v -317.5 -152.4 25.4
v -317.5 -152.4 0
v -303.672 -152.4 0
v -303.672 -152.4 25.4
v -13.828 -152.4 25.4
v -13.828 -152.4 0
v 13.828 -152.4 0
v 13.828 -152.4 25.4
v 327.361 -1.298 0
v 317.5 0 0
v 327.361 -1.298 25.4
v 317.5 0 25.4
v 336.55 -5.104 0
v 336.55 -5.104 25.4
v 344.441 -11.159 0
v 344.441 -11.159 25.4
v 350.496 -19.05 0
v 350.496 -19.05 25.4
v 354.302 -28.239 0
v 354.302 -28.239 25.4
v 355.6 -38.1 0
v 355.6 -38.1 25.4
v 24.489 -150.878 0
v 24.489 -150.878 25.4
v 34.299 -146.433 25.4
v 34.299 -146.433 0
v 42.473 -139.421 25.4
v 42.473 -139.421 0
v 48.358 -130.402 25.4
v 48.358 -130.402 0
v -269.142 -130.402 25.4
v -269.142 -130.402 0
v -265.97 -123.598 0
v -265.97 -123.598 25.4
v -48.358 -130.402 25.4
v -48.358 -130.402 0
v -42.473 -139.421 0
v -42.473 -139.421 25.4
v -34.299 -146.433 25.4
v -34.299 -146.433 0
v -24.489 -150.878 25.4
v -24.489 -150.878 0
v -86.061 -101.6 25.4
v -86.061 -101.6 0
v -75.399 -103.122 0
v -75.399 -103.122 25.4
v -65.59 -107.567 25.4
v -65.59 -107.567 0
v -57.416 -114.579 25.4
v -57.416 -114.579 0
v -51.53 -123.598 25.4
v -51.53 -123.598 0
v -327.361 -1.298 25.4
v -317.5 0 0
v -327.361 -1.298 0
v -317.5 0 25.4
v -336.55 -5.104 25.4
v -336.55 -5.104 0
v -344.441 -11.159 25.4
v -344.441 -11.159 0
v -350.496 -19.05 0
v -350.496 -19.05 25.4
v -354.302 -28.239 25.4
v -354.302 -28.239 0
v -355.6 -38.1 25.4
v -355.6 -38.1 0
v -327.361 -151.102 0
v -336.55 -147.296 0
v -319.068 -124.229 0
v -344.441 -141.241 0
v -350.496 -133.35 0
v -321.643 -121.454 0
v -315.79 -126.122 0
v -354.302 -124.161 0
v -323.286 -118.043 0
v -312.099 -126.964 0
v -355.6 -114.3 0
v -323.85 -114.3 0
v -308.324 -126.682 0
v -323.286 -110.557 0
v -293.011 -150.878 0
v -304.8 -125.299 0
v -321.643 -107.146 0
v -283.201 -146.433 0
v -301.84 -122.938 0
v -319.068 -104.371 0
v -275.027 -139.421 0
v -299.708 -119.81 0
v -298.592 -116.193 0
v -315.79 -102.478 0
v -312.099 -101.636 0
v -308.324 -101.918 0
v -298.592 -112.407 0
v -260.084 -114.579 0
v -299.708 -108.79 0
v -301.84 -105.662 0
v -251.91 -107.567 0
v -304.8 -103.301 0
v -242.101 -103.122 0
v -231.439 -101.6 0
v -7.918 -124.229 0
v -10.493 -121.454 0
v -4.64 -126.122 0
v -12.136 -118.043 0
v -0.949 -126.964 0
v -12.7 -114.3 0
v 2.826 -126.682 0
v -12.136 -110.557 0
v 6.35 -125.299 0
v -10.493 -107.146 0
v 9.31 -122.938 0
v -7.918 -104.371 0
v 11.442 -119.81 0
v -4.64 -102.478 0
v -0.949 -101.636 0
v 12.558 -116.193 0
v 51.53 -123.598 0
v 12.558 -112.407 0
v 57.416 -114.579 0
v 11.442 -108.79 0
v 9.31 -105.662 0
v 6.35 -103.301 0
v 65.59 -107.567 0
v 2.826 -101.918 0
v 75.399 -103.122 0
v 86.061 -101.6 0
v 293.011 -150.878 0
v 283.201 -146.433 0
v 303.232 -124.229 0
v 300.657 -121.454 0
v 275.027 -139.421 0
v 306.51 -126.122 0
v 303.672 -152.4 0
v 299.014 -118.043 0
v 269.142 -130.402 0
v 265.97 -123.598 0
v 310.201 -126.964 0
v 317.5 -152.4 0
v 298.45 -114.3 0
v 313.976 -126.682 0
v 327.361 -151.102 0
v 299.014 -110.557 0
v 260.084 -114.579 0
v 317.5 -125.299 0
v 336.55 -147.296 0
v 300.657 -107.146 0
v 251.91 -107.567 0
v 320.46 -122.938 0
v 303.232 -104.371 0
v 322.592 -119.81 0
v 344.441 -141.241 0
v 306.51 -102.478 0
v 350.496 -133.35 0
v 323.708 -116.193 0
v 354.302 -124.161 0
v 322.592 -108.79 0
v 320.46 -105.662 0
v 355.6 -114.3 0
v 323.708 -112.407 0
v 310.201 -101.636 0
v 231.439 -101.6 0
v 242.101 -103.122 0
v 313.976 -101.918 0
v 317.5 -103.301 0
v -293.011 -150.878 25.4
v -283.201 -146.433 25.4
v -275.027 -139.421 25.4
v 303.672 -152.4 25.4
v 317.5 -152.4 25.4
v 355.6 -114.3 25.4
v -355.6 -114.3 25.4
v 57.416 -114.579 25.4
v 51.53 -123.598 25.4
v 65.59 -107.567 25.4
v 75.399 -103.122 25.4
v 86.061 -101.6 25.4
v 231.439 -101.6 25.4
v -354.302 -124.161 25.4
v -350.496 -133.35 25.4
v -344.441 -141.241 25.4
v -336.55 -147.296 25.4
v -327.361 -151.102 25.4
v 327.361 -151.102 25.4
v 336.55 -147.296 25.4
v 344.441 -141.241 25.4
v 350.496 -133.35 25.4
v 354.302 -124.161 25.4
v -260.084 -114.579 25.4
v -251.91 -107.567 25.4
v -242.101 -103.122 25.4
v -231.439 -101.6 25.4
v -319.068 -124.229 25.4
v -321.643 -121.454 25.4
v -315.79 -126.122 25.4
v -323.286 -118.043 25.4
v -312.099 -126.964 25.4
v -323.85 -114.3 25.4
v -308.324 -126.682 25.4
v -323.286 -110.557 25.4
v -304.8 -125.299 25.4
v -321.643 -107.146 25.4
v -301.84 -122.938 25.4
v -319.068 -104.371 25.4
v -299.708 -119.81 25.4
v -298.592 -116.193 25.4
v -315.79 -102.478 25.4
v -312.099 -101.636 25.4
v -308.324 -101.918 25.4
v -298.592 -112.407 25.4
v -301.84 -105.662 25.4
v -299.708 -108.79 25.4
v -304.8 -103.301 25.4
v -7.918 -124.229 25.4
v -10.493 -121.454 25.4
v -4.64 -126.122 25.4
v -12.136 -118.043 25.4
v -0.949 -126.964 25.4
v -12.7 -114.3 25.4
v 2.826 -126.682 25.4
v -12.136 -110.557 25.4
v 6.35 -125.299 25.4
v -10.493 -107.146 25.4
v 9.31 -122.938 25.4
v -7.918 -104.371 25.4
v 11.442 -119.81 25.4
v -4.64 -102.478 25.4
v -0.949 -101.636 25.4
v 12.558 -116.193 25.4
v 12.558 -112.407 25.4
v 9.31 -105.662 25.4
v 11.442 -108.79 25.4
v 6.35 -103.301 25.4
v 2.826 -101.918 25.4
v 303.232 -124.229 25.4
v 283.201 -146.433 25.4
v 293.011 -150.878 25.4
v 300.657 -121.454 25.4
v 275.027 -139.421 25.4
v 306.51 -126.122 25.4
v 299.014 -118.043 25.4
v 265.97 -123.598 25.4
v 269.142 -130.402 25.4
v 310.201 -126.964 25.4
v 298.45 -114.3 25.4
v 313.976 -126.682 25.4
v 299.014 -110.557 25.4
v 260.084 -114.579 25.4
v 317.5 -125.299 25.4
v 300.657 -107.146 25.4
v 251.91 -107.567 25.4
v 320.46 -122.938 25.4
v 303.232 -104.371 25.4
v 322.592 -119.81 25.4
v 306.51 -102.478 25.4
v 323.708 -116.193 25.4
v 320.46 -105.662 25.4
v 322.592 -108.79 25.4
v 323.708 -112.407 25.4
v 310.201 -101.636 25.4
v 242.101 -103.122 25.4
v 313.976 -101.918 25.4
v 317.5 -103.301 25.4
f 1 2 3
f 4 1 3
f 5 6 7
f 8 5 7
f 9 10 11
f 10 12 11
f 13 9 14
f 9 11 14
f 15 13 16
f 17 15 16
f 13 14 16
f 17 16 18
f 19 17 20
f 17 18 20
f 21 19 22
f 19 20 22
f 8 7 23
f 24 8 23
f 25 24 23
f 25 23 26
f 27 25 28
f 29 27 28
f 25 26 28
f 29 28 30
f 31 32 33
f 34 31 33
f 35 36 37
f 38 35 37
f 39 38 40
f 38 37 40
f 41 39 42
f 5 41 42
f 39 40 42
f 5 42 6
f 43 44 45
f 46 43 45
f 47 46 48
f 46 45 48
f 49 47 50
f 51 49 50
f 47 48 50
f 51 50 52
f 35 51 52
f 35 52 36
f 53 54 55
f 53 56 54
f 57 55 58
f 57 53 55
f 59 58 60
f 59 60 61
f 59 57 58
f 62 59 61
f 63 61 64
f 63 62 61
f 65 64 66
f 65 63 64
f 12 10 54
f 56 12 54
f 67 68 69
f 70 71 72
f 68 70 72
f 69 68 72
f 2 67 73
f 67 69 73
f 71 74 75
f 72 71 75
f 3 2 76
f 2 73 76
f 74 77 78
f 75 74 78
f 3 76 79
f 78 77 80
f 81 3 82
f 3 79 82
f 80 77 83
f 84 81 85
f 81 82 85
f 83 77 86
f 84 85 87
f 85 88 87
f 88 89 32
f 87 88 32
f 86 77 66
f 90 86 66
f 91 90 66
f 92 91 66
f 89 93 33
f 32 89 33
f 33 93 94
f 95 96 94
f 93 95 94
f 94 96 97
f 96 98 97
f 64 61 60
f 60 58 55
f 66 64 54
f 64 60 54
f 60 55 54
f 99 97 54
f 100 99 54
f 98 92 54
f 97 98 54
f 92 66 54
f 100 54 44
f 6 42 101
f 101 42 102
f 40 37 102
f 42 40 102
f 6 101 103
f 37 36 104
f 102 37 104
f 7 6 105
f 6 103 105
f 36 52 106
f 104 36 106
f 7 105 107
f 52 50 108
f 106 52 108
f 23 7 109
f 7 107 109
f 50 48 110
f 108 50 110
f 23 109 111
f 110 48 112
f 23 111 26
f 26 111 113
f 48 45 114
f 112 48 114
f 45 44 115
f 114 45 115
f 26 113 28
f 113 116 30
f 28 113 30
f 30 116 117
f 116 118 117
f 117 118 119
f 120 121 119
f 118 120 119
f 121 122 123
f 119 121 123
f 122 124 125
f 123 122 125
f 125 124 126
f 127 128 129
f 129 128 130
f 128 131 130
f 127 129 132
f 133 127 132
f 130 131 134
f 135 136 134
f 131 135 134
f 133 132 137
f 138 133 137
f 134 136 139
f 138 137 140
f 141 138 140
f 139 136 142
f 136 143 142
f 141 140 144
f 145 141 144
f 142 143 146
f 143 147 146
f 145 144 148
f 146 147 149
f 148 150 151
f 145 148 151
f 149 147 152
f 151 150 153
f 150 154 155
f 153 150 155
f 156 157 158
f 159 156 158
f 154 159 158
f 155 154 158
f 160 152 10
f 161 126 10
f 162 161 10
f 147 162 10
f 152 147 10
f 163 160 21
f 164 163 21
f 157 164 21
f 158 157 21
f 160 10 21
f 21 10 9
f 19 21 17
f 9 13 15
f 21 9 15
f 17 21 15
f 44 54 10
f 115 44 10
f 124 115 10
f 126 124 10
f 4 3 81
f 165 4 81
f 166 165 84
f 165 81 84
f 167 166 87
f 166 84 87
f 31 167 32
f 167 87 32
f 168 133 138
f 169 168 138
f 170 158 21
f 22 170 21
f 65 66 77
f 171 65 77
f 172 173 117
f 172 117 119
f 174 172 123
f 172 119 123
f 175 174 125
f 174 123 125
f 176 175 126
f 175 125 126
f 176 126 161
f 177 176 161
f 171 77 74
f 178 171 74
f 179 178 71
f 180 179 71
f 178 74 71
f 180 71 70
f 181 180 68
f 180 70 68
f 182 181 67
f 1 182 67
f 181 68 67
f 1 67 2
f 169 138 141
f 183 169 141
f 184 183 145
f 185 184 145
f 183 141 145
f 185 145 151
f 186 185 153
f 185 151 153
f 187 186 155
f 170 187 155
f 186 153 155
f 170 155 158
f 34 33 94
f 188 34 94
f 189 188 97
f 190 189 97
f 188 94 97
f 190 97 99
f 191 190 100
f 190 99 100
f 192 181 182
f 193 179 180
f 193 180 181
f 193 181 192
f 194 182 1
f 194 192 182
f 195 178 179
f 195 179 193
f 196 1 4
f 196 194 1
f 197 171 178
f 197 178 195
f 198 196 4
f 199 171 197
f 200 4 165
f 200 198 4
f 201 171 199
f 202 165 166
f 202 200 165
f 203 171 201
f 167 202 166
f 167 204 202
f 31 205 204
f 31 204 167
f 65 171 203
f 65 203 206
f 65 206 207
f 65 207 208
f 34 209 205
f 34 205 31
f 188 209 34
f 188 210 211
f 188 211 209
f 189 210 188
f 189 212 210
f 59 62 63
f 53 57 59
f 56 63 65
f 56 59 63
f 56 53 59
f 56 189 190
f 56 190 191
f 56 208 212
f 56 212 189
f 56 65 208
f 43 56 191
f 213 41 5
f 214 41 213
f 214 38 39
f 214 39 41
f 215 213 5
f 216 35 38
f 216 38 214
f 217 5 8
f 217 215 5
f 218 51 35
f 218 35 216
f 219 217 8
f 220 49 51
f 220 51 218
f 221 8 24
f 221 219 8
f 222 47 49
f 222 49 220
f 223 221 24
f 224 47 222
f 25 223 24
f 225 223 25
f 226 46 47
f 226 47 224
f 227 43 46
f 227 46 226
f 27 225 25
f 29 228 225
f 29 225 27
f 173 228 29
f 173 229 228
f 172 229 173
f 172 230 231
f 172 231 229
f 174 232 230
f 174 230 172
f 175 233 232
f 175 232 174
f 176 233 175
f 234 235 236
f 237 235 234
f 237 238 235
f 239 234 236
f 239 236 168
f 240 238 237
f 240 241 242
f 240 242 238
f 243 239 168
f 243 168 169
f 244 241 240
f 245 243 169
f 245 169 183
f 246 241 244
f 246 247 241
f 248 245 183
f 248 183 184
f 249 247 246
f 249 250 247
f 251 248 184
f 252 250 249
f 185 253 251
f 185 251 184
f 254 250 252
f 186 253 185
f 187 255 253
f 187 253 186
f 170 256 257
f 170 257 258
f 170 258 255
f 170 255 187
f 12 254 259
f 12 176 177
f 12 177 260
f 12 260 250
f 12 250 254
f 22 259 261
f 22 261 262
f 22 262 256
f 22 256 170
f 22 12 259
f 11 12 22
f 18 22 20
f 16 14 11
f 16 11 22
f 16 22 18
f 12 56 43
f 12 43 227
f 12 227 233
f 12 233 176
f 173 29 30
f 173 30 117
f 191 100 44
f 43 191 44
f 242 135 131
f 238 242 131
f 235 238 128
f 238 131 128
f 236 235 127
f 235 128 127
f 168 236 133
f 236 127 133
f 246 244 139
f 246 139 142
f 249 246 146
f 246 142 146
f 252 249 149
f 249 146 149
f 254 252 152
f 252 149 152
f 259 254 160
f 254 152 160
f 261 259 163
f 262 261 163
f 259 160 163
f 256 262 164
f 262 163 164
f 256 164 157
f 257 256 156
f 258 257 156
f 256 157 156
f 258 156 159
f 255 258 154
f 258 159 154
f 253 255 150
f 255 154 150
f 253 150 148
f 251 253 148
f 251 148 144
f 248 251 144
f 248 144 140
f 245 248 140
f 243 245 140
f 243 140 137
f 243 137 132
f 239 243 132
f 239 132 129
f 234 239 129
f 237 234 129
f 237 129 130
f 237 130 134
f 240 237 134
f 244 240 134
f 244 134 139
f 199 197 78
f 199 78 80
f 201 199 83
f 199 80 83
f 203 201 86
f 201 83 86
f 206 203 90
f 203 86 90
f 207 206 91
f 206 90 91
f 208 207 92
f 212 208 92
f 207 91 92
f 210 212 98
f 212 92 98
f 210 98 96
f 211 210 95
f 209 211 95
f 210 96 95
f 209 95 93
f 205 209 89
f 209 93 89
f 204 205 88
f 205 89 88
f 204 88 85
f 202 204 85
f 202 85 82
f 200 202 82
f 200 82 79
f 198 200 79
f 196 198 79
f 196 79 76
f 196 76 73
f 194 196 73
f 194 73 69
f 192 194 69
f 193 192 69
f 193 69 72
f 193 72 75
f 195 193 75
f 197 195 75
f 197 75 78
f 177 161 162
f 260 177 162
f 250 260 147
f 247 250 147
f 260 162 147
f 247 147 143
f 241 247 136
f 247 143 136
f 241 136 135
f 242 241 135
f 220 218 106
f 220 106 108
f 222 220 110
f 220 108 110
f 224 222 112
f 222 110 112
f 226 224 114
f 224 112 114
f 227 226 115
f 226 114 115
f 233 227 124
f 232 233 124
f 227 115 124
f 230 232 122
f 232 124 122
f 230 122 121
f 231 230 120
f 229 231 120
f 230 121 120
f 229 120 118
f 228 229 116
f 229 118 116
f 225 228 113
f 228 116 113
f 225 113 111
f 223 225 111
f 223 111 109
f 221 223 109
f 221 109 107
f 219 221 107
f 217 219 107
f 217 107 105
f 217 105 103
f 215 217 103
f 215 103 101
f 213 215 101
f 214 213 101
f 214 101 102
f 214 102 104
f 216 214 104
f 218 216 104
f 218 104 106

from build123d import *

# Parameters (mm, degrees)
F1_DEPTH = 25.4
F2_R     = 38.1
F4_D     = 25.4


with BuildPart() as f1:
    # F0 (on Top) → F1 (new body)
    with BuildSketch(Plane.XY):
        with BuildLine():
            Line((355.6, 0), (-355.6, 0))
            Line((-355.6, 0), (-355.6, -114.3))
            ThreePointArc((-355.6, -114.3), (-344.4407683632, -141.2407683632), (-317.5, -152.4))
            Line((-317.5, -152.4), (-303.6723769368, -152.4))
            ThreePointArc((-303.6723769368, -152.4), (-283.2012618588, -146.4332140855), (-269.1420502507, -130.4017557723))
            Line((-269.1420502507, -130.4017557723), (-265.9695207151, -123.5982442277))
            ThreePointArc((-265.9695207151, -123.5982442277), (-251.910309107, -107.5667859145), (-231.439194029, -101.6))
            Line((-231.439194029, -101.6), (-86.060805971, -101.6))
            ThreePointArc((-86.060805971, -101.6), (-65.589690893, -107.5667859145), (-51.5304792849, -123.5982442277))
            Line((-51.5304792849, -123.5982442277), (-48.3579497493, -130.4017557723))
            ThreePointArc((-48.3579497493, -130.4017557723), (-34.2987381412, -146.4332140855), (-13.8276230632, -152.4))
            Line((-13.8276230632, -152.4), (13.8276230632, -152.4))
            ThreePointArc((13.8276230632, -152.4), (34.2987381412, -146.4332140855), (48.3579497493, -130.4017557723))
            Line((48.3579497493, -130.4017557723), (51.5304792849, -123.5982442277))
            ThreePointArc((51.5304792849, -123.5982442277), (65.589690893, -107.5667859145), (86.060805971, -101.6))
            Line((86.060805971, -101.6), (231.439194029, -101.6))
            ThreePointArc((231.439194029, -101.6), (251.910309107, -107.5667859145), (265.9695207151, -123.5982442277))
            Line((265.9695207151, -123.5982442277), (269.1420502507, -130.4017557723))
            ThreePointArc((269.1420502507, -130.4017557723), (283.2012618588, -146.4332140855), (303.6723769368, -152.4))
            Line((303.6723769368, -152.4), (317.5, -152.4))
            ThreePointArc((317.5, -152.4), (344.4407683632, -141.2407683632), (355.6, -114.3))
            Line((355.6, -114.3), (355.6, 0))
        make_face()
    extrude(amount=F1_DEPTH)

    # F2
    f2_edges = [f1.edges().sort_by_distance(p)[0] for p in [
        (355.6, 0, 12.7),
        (-355.6, 0, 12.7),
    ]]
    fillet(f2_edges, radius=F2_R)

    # F4 (through all)
    with Locations(Plane.XY.offset(25.4)):
        with Locations((-311.15, -114.3), (0, -114.3), (311.15, -114.3)):
            Hole(F4_D / 2)


solid = f1.part
